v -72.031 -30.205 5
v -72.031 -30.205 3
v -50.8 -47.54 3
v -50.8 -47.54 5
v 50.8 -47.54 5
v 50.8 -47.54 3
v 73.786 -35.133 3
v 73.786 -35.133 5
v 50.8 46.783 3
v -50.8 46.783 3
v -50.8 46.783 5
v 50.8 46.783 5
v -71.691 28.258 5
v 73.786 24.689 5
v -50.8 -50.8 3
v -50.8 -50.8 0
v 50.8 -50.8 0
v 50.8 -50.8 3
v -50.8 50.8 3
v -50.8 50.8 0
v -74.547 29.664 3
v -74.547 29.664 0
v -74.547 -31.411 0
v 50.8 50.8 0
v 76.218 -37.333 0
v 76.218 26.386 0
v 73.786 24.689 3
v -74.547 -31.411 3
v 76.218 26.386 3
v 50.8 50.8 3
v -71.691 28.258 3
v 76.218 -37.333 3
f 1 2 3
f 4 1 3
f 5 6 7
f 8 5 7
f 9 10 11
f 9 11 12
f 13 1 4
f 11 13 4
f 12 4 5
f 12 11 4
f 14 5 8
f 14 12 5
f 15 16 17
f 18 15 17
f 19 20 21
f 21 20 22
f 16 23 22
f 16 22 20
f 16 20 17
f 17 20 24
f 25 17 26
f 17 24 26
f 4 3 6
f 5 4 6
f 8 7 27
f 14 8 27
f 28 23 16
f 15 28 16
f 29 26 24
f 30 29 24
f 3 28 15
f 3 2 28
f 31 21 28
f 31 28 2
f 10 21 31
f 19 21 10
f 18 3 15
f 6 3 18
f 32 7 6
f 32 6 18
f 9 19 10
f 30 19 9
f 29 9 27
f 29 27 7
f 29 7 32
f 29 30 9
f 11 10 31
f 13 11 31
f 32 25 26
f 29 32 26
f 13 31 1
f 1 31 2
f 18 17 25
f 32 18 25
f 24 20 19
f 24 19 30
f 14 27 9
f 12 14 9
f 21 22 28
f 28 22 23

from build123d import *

# Parameters (mm, degrees)
F0_W     = 101.6
F0_H     = 94.322458
F1_DEPTH = 5
F0_H_2   = 4.017089
F0_H_3   = 3.260453
F2_DEPTH = 3


with BuildPart() as f1:
    # F0 (on Top) → F1 (new body)
    with BuildSketch(Plane.XY):
        Polygon((-50.8, -47.539547), (-50.8, 46.782911), (-71.69123, 28.25832), (-72.031133, -30.204607), align=None)
        with Locations((0, -0.378318)):
            Rectangle(F0_W, F0_H)
        Polygon((73.786288, 24.689363), (50.8, 46.782911), (50.8, -47.539547), (73.786288, -35.133168), align=None)
    extrude(amount=F1_DEPTH)

    # F0 (on Top) → F2 (join)
    with BuildSketch(Plane.XY):
        Polygon((-50.8, 46.782911), (-50.8, 50.8), (-74.547097, 29.664359), (-74.547097, -31.410809), (-50.8, -50.8), (-50.8, -47.539547), (-72.031133, -30.204607), (-71.69123, 28.25832), align=None)
        with Locations((0, 48.791455)):
            Rectangle(F0_W, F0_H_2)
        Polygon((76.217584, 26.386153), (50.8, 50.8), (50.8, 46.782911), (73.786288, 24.689363), (73.786288, -35.133168), (50.8, -47.539547), (50.8, -50.8), (76.217584, -37.332729), align=None)
        with Locations((0, -49.169773)):
            Rectangle(F0_W, F0_H_3)
    extrude(amount=F2_DEPTH)


solid = f1.part
